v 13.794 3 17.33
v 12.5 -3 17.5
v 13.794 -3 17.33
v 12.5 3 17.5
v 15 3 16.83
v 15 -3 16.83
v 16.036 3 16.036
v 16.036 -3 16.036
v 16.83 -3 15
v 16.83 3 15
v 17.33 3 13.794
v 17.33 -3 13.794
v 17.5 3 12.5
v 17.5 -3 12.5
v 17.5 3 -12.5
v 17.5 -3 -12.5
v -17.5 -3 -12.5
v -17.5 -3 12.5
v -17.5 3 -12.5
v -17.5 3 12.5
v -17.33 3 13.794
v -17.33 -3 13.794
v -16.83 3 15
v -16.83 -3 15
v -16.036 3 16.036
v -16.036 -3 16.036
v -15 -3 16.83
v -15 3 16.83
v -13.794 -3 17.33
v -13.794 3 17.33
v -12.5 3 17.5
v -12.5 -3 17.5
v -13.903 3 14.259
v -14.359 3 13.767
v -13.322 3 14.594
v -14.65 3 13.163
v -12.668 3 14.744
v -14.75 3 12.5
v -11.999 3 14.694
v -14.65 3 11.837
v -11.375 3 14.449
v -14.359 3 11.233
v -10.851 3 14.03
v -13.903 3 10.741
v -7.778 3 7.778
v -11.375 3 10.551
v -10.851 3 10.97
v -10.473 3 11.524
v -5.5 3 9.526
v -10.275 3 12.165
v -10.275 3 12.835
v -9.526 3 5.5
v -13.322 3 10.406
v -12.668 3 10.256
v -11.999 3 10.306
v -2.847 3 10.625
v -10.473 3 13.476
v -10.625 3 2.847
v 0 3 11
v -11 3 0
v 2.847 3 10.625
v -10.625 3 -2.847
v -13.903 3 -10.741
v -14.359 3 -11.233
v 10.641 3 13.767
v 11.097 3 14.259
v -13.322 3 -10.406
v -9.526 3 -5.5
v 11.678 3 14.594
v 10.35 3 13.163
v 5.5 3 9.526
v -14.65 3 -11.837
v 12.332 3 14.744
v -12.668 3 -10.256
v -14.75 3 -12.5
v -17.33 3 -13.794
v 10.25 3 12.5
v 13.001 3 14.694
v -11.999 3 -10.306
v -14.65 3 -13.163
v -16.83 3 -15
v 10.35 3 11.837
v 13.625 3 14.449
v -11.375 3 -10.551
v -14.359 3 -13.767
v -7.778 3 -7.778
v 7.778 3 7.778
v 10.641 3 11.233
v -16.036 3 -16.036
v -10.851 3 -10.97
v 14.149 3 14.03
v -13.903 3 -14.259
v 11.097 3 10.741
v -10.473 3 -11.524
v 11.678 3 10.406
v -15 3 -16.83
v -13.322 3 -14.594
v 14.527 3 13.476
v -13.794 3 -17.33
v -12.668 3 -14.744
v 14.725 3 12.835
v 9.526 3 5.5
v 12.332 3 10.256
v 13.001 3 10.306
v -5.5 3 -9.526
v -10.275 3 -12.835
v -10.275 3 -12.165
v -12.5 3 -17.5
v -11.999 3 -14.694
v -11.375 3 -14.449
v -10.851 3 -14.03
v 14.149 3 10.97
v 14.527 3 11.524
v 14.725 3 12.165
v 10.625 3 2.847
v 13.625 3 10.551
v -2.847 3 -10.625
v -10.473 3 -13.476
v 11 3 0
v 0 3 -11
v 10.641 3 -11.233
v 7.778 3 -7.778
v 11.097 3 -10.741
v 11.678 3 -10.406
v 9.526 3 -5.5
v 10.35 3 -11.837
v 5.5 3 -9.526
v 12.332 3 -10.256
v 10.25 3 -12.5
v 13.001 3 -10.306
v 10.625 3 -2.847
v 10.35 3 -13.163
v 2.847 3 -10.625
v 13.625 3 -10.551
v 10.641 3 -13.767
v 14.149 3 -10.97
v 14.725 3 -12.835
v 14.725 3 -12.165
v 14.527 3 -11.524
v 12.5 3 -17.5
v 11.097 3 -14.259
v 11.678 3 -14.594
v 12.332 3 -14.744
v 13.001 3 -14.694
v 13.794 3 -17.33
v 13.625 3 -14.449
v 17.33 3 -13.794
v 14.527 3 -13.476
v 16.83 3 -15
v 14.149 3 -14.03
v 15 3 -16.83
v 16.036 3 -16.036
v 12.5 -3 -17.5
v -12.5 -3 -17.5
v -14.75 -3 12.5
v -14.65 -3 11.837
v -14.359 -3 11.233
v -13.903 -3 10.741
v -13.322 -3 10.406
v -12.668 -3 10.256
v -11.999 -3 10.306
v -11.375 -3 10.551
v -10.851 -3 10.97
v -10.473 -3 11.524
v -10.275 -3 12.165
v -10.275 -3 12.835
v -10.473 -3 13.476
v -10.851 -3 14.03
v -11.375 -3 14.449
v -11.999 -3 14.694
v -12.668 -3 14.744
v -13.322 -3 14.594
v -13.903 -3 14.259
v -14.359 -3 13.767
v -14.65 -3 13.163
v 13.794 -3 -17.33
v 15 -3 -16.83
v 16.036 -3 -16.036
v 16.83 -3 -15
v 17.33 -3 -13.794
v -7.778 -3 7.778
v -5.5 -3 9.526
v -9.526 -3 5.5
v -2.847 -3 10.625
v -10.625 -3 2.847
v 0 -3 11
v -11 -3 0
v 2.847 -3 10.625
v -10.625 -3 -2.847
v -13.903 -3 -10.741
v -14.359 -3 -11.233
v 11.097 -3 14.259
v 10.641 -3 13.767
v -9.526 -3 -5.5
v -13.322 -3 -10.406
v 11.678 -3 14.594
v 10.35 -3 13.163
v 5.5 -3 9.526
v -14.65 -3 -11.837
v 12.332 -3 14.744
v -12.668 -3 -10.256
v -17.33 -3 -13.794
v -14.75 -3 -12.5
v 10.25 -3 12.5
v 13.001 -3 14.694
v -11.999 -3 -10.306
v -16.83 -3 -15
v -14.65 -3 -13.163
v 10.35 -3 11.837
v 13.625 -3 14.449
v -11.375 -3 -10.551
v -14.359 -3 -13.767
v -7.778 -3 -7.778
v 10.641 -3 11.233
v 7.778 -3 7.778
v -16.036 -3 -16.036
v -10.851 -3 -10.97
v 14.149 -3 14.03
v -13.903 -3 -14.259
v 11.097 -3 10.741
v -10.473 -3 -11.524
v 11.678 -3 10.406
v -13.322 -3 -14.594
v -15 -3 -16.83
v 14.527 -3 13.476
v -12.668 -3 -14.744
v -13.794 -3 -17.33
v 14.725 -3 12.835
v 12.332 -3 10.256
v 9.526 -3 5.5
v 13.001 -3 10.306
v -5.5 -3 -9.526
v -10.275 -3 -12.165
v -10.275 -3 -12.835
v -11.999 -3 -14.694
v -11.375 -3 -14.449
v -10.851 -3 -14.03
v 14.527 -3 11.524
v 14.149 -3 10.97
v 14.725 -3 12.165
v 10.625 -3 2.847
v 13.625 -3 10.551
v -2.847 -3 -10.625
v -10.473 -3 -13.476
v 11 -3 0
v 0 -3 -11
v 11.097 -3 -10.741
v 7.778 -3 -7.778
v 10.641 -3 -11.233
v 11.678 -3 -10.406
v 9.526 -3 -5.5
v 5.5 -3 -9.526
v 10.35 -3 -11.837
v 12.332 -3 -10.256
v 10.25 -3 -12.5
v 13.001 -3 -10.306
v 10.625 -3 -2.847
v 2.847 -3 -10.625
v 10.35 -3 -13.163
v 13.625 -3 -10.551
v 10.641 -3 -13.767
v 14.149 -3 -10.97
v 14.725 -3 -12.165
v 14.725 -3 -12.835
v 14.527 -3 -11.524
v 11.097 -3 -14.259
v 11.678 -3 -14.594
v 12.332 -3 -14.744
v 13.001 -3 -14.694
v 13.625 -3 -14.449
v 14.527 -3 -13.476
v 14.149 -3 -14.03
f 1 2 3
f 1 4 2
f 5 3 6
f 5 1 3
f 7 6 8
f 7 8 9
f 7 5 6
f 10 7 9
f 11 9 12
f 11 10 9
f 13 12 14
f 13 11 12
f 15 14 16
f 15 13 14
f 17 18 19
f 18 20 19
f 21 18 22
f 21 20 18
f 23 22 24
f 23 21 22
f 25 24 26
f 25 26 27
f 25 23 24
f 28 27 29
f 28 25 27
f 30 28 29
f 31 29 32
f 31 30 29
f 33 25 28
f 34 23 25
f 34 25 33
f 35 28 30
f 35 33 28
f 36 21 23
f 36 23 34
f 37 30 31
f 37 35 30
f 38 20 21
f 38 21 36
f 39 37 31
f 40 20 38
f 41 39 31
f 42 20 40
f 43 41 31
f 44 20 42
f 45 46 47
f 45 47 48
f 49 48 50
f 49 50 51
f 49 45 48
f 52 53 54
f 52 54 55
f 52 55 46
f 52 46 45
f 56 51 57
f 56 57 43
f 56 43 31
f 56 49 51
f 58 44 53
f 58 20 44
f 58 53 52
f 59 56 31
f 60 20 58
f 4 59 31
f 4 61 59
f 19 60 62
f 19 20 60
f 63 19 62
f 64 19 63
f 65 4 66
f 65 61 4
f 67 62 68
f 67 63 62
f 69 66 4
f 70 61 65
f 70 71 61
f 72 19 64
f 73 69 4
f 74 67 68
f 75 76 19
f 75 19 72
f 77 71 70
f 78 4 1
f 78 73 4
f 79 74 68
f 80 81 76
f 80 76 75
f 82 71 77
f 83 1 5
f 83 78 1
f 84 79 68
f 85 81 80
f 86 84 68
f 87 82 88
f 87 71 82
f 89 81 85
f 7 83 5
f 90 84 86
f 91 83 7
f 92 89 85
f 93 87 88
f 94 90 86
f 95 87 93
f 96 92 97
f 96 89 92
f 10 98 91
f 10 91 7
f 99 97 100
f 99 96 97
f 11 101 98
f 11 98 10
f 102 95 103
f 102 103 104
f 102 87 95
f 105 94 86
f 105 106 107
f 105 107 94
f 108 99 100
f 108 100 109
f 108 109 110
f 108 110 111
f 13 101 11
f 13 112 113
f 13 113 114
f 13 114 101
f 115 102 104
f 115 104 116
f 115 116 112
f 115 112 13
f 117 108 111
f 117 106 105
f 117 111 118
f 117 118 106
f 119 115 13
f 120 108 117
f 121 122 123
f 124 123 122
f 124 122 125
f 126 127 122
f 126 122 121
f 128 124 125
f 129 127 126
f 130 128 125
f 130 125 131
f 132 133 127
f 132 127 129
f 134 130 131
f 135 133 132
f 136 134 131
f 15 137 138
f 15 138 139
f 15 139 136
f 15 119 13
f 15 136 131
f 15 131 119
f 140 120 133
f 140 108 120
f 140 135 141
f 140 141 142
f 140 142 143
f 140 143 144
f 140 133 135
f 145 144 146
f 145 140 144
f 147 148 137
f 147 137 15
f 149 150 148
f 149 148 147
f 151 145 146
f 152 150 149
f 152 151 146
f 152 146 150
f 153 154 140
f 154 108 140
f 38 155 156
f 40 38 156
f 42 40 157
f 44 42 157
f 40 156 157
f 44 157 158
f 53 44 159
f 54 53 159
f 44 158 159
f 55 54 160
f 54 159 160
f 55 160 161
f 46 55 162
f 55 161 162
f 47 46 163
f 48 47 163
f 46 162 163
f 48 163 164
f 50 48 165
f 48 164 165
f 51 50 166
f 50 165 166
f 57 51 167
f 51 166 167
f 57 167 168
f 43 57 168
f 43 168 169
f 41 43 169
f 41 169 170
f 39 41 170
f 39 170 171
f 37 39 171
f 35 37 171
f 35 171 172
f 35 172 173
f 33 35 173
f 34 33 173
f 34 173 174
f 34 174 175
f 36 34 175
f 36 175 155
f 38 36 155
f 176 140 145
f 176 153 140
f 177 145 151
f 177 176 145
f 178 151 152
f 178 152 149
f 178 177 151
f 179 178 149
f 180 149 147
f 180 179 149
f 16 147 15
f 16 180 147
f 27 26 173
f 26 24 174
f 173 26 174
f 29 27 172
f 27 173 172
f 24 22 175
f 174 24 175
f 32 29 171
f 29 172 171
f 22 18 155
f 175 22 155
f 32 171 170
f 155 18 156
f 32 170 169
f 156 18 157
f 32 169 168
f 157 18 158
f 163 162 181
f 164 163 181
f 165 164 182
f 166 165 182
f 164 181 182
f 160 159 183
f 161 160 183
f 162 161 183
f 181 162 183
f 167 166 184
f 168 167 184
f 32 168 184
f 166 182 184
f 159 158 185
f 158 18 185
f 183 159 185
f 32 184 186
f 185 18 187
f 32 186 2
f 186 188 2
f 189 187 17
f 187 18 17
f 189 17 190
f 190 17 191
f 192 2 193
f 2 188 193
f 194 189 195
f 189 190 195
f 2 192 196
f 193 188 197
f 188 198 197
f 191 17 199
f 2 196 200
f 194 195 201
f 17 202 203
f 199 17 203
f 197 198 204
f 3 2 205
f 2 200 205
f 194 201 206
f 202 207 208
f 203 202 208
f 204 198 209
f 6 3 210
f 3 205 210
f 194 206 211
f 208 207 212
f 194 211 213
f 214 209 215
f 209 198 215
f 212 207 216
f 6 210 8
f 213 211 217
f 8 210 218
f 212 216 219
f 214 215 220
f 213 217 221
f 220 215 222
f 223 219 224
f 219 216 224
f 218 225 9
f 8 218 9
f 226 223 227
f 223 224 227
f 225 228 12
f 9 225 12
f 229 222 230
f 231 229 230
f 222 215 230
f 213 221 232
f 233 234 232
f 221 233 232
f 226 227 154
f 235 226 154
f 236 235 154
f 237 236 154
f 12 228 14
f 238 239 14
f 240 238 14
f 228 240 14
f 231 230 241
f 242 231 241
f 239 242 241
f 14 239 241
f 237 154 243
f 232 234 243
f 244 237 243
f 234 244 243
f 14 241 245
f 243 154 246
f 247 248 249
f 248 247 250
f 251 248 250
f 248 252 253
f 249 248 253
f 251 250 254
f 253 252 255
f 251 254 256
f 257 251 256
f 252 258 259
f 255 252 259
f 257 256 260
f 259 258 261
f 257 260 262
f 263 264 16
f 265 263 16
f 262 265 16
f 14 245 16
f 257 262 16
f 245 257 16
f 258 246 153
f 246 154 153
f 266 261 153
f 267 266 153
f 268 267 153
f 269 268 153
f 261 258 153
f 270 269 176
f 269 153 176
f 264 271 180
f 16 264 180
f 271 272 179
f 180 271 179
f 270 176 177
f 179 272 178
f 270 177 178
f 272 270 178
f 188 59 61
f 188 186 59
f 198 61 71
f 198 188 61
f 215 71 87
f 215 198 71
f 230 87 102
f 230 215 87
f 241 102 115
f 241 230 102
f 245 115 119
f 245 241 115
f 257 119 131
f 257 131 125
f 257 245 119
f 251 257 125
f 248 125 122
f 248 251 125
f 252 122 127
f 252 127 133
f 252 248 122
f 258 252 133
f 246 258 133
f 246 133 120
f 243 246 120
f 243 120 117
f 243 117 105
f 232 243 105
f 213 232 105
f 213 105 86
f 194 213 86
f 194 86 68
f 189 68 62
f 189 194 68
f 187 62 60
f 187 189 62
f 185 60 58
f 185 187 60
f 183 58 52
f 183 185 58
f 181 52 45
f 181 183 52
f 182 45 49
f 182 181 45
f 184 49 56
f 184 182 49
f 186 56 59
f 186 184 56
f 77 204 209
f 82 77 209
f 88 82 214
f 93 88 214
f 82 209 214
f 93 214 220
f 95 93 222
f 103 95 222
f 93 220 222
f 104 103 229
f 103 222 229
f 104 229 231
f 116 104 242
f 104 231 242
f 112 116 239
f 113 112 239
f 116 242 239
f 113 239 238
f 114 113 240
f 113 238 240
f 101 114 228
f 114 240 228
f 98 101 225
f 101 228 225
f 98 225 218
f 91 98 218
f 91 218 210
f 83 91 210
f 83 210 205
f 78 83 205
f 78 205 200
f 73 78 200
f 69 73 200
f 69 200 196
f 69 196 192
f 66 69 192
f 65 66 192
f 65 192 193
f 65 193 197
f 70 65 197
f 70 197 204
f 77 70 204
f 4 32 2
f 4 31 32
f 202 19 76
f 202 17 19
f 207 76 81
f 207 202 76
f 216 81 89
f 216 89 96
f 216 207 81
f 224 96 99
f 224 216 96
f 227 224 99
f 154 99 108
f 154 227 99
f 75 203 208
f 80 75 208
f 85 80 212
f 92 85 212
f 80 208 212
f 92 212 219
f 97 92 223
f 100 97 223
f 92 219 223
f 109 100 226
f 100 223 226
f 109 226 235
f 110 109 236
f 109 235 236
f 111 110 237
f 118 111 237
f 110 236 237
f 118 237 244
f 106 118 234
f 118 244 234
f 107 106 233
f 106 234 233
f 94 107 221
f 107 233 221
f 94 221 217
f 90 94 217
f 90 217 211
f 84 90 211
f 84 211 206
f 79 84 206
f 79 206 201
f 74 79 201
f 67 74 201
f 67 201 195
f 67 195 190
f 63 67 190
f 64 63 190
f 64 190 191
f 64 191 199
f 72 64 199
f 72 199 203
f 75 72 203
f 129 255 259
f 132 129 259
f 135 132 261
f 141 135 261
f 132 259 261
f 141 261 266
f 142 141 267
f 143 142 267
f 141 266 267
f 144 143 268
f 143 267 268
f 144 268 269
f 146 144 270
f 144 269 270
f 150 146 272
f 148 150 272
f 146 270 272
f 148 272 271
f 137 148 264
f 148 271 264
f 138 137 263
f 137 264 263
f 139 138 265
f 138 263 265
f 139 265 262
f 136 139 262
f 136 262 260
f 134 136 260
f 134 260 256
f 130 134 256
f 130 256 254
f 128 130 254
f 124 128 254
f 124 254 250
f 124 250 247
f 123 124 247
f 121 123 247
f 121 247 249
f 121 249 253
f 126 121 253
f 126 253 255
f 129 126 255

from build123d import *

# Parameters (mm, degrees)
CROQUIS1_W                   = 35
CROQUIS1_H                   = 35
CROQUIS1_R                   = 11
SALIENTE_EXTRUIR1_DEPTH      = 3
TALADRO_DE_MARGEN_PARA_M41_D = 4.5
REDONDEO1_R                  = 5


with BuildPart() as part:
    # Croquis1 → Saliente-Extruir1 (new, symmetric)
    with BuildSketch(Plane(origin=(0, 0, 0), x_dir=(1, 0, 0), z_dir=(0, 1, 0))):
        Rectangle(CROQUIS1_W, CROQUIS1_H)
        with Locations(Location((0, 0, 0), (0, 0, 270))):
            Circle(CROQUIS1_R, mode=Mode.SUBTRACT)
    extrude(amount=SALIENTE_EXTRUIR1_DEPTH, both=True)

    # Taladro de margen para M41 (through all)
    with Locations(Plane(origin=(0, 3, 0), x_dir=(1, 0, 0), z_dir=(0, 1, 0))):
        with Locations((12.5, 12.5), (-12.5, 12.5), (-12.5, -12.5), (12.5, -12.5)):
            Hole(TALADRO_DE_MARGEN_PARA_M41_D / 2)

    # Redondeo1
    redondeo1_edges = [part.edges().sort_by_distance(p)[0] for p in [
        (17.5, 0, 17.5),
        (-17.5, 0, 17.5),
        (-17.5, 0, -17.5),
        (17.5, 0, -17.5),
    ]]
    fillet(redondeo1_edges, radius=REDONDEO1_R)


solid = part.part
